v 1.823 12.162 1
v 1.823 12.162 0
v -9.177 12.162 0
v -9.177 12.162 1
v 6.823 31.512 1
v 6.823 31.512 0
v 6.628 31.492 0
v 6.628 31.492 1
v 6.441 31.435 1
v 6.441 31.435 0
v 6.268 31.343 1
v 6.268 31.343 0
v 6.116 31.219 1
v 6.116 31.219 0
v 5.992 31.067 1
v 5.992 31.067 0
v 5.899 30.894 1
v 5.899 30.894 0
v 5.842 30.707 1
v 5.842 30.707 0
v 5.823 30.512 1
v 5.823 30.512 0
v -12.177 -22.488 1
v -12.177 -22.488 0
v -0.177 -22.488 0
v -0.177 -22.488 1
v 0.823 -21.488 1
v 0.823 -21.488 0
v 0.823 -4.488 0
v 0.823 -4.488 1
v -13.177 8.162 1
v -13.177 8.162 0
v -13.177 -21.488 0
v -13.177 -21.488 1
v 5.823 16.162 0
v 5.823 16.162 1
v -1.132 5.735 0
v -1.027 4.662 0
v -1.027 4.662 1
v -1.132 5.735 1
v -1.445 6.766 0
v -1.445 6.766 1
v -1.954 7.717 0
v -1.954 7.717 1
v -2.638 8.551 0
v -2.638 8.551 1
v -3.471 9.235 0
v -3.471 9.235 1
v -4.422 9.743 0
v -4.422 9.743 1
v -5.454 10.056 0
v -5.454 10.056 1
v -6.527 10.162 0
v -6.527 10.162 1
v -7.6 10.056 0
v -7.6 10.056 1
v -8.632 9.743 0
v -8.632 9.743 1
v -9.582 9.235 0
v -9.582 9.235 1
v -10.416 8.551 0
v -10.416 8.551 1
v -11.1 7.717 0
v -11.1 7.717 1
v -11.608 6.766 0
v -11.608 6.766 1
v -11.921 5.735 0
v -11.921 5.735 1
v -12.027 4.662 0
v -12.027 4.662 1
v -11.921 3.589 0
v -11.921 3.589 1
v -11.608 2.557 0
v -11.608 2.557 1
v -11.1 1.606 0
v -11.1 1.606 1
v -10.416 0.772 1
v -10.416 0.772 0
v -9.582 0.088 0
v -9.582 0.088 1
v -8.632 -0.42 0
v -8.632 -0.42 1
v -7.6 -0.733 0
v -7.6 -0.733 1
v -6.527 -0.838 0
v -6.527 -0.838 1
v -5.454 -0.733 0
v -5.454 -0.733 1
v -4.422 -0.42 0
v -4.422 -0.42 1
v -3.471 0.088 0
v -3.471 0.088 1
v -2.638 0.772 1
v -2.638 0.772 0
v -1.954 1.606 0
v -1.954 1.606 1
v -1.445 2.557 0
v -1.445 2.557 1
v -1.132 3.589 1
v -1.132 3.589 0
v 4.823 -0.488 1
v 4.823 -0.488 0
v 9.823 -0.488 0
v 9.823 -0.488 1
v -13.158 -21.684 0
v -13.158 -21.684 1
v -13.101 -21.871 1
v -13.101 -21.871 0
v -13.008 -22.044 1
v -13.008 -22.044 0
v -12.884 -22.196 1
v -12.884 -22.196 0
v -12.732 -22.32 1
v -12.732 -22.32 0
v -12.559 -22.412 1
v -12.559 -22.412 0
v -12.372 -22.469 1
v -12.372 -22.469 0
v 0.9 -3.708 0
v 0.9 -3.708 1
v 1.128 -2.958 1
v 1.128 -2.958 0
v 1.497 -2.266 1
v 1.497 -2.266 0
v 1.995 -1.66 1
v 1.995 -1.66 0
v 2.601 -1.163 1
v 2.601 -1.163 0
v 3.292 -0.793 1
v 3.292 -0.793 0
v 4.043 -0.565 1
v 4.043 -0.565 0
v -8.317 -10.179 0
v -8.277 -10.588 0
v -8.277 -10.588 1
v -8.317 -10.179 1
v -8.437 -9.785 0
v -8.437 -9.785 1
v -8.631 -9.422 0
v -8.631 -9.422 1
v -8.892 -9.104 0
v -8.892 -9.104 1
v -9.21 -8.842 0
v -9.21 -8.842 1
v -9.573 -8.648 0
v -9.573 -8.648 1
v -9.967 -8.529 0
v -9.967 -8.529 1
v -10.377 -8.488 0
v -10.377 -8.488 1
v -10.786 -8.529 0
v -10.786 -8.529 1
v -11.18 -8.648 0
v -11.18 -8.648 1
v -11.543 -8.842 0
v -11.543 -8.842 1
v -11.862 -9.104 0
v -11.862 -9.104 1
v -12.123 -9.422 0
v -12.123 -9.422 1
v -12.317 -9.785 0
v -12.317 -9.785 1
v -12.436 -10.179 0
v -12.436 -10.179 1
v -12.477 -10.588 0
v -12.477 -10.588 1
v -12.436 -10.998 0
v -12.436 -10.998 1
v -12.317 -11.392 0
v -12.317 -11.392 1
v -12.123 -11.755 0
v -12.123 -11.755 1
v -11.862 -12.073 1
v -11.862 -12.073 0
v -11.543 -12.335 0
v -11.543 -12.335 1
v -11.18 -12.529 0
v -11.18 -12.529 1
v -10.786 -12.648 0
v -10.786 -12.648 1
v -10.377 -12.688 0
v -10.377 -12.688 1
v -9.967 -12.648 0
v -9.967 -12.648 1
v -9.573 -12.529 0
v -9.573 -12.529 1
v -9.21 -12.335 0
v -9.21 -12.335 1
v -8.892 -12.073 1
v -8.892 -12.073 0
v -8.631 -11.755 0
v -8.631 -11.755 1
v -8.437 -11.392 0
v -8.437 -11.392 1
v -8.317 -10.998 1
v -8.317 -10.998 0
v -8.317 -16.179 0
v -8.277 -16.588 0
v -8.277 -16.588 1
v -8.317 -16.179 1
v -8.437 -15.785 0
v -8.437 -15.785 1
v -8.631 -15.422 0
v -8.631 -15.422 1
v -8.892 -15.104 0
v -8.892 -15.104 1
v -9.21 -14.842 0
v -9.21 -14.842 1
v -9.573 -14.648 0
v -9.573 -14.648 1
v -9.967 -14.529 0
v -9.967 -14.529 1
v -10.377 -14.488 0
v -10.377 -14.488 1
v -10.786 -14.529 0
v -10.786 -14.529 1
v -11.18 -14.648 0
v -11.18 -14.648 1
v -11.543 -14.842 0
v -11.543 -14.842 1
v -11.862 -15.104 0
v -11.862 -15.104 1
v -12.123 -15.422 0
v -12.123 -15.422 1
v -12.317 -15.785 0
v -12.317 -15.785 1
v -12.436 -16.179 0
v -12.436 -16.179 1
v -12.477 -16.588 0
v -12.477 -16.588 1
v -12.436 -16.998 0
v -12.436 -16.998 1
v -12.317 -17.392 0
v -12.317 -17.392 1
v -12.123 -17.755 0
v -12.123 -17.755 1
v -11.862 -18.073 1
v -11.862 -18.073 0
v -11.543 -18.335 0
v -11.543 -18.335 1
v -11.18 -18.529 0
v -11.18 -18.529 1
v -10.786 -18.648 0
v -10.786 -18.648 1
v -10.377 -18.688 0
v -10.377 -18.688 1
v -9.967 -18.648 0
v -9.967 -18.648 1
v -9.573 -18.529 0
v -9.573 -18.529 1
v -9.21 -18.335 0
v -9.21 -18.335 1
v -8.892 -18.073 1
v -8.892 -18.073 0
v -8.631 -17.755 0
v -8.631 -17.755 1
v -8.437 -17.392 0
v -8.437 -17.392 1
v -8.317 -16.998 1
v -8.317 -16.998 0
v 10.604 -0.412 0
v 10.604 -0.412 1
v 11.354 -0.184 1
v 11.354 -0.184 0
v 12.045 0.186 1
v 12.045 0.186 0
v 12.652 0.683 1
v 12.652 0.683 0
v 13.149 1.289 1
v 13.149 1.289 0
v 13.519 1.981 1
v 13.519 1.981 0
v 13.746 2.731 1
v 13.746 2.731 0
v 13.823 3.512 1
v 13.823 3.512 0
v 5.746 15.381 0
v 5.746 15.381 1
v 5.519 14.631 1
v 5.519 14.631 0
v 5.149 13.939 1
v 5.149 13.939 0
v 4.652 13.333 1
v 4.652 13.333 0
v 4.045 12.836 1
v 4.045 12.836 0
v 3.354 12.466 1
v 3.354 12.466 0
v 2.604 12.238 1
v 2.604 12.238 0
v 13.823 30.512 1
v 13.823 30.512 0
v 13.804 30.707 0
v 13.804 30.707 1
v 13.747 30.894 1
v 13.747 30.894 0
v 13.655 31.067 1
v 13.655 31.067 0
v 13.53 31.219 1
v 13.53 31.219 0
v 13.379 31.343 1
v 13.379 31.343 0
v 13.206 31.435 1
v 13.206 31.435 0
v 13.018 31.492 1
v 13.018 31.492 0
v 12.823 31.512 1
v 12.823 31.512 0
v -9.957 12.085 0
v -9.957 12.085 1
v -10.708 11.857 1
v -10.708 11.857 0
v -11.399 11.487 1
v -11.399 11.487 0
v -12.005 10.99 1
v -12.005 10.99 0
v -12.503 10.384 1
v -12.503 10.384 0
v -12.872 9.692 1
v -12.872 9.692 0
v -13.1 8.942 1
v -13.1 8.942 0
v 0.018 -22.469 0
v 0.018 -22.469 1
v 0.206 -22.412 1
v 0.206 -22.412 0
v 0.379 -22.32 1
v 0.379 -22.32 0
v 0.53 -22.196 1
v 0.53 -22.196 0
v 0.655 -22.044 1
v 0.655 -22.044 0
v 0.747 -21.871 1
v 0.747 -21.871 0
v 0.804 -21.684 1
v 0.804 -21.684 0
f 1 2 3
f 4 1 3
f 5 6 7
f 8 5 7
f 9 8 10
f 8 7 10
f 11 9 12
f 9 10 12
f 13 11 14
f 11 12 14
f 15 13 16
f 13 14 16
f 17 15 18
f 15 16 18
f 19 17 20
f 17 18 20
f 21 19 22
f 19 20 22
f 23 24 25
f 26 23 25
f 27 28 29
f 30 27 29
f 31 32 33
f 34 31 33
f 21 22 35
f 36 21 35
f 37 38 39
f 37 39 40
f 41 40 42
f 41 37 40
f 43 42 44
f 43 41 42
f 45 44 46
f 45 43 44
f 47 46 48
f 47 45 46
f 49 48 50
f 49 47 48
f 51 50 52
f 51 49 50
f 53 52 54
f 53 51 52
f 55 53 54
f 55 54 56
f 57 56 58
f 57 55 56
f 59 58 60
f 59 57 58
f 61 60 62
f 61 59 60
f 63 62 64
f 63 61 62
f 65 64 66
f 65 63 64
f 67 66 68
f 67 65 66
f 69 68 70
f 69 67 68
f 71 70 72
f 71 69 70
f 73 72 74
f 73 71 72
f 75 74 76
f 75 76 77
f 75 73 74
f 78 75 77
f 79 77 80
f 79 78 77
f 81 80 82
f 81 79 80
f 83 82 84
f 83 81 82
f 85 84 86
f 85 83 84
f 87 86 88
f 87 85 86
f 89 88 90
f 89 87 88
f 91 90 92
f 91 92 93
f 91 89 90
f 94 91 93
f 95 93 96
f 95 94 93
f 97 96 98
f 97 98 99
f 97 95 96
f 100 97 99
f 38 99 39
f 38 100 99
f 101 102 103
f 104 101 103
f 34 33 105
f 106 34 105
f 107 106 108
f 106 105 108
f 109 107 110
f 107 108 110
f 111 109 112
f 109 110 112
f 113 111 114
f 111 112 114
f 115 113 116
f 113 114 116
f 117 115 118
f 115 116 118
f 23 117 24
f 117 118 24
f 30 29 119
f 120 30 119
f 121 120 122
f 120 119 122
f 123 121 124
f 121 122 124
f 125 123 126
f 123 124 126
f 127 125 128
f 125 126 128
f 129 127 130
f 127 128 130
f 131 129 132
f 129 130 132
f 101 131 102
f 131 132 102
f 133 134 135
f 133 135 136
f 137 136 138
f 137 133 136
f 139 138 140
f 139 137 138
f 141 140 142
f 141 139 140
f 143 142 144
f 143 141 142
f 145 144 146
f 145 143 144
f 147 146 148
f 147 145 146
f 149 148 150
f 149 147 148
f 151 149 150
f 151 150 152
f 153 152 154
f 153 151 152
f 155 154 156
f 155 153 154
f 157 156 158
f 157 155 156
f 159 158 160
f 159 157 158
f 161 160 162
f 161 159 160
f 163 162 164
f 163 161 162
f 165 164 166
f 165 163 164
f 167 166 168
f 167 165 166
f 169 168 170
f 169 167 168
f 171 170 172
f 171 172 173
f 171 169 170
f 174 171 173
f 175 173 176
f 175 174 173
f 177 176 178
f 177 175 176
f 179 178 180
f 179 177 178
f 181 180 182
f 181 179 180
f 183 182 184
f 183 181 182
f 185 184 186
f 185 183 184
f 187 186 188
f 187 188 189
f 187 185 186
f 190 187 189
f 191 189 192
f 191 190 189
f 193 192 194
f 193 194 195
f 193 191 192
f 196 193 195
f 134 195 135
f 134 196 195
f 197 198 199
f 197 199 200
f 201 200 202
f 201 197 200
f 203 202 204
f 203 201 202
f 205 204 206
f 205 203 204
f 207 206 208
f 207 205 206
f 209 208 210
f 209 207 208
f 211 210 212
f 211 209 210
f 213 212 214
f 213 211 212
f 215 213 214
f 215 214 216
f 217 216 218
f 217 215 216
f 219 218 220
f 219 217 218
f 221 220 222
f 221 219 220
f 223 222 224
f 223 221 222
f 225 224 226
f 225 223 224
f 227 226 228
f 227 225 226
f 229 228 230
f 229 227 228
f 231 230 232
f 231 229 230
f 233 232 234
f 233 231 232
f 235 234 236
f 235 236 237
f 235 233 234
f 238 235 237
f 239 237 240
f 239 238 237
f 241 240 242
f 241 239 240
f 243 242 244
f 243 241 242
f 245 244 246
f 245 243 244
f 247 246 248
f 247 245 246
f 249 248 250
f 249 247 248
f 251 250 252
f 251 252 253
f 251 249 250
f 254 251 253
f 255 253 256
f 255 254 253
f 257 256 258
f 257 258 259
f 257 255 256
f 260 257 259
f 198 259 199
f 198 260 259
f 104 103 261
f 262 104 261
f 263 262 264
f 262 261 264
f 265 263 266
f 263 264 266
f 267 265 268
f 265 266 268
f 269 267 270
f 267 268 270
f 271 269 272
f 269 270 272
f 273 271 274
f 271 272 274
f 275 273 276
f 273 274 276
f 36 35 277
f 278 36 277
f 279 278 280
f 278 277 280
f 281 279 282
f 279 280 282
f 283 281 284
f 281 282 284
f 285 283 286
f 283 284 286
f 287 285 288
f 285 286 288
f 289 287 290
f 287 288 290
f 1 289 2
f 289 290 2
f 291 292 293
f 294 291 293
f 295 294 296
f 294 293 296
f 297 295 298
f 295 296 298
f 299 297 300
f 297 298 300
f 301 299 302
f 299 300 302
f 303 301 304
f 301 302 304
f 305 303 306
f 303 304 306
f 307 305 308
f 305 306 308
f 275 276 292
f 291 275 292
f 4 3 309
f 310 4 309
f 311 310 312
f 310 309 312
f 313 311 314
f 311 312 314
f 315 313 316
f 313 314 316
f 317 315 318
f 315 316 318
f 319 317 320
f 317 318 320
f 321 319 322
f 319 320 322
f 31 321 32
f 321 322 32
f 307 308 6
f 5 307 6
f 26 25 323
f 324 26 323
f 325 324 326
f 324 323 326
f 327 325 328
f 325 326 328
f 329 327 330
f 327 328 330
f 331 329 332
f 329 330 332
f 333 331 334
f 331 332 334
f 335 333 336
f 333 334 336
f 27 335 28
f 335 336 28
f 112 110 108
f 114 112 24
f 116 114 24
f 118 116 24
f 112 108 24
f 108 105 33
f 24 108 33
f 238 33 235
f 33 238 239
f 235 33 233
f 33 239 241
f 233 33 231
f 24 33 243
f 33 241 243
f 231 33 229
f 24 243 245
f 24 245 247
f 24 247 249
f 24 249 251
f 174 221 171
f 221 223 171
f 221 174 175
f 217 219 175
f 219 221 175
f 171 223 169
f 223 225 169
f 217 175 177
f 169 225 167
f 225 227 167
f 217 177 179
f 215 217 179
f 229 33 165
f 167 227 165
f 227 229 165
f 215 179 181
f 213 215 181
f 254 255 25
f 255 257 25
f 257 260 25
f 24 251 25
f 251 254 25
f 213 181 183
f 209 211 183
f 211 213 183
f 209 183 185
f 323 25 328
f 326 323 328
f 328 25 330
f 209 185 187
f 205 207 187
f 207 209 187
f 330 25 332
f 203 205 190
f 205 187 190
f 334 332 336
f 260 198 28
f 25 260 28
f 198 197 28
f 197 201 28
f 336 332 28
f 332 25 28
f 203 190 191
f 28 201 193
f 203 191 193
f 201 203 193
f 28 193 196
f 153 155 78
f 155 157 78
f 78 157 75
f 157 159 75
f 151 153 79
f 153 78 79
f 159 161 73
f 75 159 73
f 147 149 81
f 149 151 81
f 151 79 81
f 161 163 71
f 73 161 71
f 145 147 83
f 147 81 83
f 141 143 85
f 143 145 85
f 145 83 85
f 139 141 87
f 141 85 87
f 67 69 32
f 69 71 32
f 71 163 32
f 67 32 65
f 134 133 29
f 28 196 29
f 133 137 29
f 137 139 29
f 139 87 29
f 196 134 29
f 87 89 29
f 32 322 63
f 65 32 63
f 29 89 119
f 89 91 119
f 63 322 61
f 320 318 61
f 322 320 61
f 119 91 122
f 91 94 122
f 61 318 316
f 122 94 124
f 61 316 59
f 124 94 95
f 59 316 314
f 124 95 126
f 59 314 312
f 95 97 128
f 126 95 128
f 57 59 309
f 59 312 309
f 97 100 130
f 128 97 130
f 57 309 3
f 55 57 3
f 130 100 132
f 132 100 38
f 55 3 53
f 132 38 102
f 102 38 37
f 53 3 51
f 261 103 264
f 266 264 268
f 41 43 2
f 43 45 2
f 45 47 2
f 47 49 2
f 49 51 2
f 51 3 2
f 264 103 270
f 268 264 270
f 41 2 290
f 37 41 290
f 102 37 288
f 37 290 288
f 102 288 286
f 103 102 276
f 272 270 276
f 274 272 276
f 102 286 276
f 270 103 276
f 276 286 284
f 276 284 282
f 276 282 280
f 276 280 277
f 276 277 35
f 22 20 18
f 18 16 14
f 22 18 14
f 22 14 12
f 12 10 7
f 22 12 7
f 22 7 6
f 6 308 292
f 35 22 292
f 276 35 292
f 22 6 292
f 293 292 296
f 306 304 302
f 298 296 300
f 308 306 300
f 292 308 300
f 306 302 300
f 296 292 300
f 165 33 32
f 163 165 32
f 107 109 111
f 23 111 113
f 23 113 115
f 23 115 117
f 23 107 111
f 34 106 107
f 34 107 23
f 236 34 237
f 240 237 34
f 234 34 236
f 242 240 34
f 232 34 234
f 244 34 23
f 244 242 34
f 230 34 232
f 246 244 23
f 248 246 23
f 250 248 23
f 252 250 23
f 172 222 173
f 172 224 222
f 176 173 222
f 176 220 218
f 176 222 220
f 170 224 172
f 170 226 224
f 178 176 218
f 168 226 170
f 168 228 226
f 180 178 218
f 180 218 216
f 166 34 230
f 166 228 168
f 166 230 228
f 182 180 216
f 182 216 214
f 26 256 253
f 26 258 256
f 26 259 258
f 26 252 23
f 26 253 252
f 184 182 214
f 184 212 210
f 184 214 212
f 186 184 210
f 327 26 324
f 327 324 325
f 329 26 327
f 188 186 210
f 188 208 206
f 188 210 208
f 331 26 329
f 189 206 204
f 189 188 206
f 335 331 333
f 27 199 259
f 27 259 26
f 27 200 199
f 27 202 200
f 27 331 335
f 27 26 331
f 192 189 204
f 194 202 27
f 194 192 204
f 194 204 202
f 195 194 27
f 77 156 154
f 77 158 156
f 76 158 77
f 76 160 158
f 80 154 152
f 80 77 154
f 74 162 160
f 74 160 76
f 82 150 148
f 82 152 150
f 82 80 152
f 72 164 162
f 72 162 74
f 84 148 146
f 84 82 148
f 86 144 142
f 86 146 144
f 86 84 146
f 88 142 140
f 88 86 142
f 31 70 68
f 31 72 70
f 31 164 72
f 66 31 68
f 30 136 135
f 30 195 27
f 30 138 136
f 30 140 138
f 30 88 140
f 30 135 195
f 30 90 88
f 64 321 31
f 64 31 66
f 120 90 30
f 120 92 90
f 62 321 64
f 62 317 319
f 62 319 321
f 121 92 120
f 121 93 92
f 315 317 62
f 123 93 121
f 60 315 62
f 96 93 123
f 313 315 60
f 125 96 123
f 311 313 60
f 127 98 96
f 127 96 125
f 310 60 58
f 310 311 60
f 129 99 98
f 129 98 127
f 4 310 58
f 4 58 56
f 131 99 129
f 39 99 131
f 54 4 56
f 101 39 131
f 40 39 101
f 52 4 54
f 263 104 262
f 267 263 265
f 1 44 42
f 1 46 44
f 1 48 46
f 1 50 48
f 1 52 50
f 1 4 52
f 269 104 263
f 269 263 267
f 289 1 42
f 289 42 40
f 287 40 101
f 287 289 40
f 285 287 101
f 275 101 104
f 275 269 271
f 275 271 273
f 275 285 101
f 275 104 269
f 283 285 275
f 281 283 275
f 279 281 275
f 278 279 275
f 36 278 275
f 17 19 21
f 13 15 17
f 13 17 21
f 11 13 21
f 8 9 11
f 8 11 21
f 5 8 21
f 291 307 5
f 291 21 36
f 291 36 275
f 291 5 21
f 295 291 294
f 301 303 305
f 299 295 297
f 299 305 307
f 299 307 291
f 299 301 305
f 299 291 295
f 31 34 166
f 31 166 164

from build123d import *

# Parameters (mm, degrees)
SKETCH2_R           = 2.1
SKETCH2_R_2         = 5.5
BOSS_EXTRUDE1_DEPTH = 1


with BuildPart() as part:
    # Sketch2 → Boss-Extrude1 (new body)
    with BuildSketch(Plane.XY):
        with BuildLine():
            Line((4.823205975, -0.488496739), (9.823205975, -0.488496739))
            ThreePointArc((9.823205975, -0.488496739), (12.6516331, 0.683076137), (13.823205975, 3.511503261))
            Line((13.823205975, 3.511503261), (13.823205975, 30.511503261))
            ThreePointArc((13.823205975, 30.511503261), (13.530312756, 31.218610043), (12.823205975, 31.511503261))
            Line((12.823205975, 31.511503261), (6.823205975, 31.511503261))
            ThreePointArc((6.823205975, 31.511503261), (6.116099194, 31.218610043), (5.823205975, 30.511503261))
            Line((5.823205975, 30.511503261), (5.823205975, 16.161503261))
            ThreePointArc((5.823205975, 16.161503261), (4.6516331, 13.333076137), (1.823205975, 12.161503261))
            Line((1.823205975, 12.161503261), (-9.176794025, 12.161503261))
            ThreePointArc((-9.176794025, 12.161503261), (-12.00522115, 10.989930386), (-13.176794025, 8.161503261))
            Line((-13.176794025, 8.161503261), (-13.176794025, -21.488496739))
            ThreePointArc((-13.176794025, -21.488496739), (-12.883900806, -22.19560352), (-12.176794025, -22.488496739))
            Line((-12.176794025, -22.488496739), (-0.176794025, -22.488496739))
            ThreePointArc((-0.176794025, -22.488496739), (0.530312756, -22.19560352), (0.823205975, -21.488496739))
            Line((0.823205975, -21.488496739), (0.823205975, -4.488496739))
            ThreePointArc((0.823205975, -4.488496739), (1.99477885, -1.660069614), (4.823205975, -0.488496739))
        make_face()
        with Locations((-10.376794025, -16.588496739)):
            Circle(SKETCH2_R, mode=Mode.SUBTRACT)
        with Locations((-10.376794025, -10.588496739)):
            Circle(SKETCH2_R, mode=Mode.SUBTRACT)
        with Locations((-6.526794025, 4.661503261)):
            Circle(SKETCH2_R_2, mode=Mode.SUBTRACT)
    extrude(amount=BOSS_EXTRUDE1_DEPTH)


solid = part.part
